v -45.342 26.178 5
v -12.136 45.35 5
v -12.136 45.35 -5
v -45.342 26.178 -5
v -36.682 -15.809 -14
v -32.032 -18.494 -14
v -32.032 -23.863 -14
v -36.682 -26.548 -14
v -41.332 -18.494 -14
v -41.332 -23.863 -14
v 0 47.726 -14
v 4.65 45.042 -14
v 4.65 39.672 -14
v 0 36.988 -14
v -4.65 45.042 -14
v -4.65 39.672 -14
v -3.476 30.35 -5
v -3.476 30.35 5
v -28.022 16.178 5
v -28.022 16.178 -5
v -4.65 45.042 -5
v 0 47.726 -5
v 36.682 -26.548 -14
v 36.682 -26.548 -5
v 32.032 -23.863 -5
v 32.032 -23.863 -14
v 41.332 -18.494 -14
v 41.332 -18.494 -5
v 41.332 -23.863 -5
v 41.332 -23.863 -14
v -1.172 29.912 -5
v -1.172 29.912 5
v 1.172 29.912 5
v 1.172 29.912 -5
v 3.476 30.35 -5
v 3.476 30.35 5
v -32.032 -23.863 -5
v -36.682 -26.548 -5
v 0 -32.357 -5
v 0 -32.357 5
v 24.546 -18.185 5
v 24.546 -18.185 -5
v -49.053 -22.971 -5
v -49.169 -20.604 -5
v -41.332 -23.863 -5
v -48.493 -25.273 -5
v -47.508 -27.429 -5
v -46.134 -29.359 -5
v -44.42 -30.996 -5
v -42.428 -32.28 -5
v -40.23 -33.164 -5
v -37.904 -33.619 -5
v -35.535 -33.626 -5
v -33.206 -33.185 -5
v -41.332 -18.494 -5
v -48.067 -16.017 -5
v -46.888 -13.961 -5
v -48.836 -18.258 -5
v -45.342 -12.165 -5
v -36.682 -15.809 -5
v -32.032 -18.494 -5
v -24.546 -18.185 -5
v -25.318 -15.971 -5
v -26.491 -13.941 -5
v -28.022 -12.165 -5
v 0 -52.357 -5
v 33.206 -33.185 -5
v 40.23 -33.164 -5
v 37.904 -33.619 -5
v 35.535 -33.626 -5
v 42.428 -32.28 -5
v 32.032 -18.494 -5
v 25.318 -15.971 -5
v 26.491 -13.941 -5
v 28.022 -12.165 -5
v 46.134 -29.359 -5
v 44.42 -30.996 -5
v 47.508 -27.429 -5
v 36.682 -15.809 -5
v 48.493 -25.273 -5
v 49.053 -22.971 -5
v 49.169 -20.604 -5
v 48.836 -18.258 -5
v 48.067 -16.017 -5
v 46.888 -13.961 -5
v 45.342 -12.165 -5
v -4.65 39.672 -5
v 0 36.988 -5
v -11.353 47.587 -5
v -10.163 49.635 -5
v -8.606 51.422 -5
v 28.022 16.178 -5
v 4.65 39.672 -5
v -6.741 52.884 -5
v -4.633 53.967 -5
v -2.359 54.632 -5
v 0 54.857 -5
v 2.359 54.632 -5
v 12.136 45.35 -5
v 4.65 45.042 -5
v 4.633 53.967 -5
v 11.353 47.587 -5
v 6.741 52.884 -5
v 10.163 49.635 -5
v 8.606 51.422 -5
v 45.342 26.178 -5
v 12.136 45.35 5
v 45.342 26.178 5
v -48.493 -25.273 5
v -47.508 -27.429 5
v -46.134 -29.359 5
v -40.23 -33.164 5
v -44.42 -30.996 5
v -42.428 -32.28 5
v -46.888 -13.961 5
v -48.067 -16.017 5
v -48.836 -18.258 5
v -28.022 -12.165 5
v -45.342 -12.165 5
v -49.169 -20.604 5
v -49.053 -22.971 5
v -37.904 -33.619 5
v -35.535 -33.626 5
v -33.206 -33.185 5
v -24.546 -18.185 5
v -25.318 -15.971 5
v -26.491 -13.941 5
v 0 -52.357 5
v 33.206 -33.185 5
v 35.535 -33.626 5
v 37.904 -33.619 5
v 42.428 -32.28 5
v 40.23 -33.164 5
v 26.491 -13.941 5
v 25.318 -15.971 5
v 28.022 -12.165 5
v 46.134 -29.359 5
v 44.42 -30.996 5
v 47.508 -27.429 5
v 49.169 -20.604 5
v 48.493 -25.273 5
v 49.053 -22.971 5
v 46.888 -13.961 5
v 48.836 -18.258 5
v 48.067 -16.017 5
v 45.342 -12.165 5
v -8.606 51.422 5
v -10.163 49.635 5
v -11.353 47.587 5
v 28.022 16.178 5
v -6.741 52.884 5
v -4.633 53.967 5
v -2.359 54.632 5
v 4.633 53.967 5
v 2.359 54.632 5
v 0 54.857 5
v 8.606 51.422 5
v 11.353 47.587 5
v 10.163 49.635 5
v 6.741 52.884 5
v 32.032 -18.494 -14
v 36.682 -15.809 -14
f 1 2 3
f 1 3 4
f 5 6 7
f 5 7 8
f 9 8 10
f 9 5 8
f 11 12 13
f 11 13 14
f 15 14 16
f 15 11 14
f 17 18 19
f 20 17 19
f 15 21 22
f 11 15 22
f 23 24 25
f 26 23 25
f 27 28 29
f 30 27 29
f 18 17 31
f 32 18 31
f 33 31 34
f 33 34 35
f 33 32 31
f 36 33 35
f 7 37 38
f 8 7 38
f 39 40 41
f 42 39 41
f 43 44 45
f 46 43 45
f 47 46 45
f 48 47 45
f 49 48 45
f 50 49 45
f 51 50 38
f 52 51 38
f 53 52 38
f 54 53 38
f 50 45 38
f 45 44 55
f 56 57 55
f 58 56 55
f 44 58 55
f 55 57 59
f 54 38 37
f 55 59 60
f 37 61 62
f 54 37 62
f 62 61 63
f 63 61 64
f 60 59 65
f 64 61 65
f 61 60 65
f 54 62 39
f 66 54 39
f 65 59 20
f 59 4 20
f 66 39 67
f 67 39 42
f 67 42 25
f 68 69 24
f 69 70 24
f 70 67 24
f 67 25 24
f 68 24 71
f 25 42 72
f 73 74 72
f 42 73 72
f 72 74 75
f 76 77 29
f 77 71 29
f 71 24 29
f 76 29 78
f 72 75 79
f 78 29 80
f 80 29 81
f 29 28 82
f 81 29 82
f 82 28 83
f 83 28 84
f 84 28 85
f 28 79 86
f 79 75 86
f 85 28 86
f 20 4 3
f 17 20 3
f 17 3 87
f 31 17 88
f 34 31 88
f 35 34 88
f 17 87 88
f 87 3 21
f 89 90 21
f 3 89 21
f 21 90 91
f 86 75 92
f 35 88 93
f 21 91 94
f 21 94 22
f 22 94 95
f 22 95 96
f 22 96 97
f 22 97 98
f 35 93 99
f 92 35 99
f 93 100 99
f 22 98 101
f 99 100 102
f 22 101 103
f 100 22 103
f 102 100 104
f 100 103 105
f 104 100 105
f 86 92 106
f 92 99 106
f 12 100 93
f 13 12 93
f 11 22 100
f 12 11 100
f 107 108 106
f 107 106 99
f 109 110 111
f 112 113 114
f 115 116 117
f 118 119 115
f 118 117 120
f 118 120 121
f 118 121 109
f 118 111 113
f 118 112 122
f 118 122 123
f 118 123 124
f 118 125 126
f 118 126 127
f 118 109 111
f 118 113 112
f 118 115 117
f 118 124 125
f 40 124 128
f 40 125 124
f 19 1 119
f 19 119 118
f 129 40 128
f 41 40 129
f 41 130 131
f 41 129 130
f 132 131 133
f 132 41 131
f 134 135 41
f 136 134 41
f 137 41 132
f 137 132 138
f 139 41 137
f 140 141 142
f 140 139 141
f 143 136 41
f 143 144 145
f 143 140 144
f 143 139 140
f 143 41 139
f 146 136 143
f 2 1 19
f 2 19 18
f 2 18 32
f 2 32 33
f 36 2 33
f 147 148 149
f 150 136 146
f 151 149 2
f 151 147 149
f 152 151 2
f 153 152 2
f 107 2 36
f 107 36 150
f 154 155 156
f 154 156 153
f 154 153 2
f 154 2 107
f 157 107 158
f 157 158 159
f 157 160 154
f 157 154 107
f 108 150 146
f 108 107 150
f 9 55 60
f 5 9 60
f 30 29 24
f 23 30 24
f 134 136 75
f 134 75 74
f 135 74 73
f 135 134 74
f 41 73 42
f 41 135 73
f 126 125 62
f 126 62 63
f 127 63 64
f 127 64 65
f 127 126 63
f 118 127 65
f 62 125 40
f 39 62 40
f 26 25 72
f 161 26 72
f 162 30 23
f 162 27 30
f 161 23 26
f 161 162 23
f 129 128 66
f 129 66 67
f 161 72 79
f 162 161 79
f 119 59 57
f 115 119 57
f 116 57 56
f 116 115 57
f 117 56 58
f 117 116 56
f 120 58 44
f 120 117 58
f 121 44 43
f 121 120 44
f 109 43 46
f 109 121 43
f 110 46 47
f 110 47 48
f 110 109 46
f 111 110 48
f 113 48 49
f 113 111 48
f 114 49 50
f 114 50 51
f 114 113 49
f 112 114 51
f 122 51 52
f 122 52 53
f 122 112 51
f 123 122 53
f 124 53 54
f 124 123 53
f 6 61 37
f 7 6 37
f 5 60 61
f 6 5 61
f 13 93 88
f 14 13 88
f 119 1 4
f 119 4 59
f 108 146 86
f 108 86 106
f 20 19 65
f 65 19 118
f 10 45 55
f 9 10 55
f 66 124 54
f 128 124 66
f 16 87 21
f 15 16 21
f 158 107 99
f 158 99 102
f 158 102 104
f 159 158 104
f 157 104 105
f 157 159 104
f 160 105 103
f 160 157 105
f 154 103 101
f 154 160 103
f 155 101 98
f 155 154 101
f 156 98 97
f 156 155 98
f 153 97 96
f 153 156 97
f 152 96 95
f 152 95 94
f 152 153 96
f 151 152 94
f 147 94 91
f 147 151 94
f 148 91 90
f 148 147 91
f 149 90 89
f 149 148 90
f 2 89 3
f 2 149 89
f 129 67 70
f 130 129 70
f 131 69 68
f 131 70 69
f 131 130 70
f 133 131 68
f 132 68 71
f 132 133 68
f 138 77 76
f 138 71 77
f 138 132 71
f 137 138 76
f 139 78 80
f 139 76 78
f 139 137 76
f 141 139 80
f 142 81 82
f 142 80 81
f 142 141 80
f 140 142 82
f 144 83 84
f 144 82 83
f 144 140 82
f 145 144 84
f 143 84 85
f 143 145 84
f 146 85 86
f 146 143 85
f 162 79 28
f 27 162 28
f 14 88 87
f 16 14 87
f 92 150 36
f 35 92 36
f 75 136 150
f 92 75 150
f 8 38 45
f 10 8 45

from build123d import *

# Parameters (mm, degrees)
SKETCH3_R           = 12.5
BOSS_EXTRUDE2_DEPTH = 5
BOSS_EXTRUDE3_DEPTH = 9


with BuildPart() as part:
    # Sketch3 → Boss-Extrude2 (new, symmetric)
    # profile 1 of 4: a face of its own
    with BuildSketch(Plane.XY):
        with Locations((-36.682238028, -21.1785)):
            Circle(SKETCH3_R)
    # profile 2 of 4: a face of its own
    with BuildSketch(Plane.XY):
        with Locations((36.682238028, -21.1785)):
            Circle(SKETCH3_R)
    # profile 3 of 4: a face of its own
    with BuildSketch(Plane.XY):
        with Locations((0, 42.357)):
            Circle(SKETCH3_R)
    # profile 4 of 4: a face of its own
    with BuildSketch(Plane.XY):
        Polygon((0, 52.357), (-45.342492066, 26.1785), (-45.342492066, -26.1785), (0, -52.357), (45.342492066, -26.1785), (45.342492066, 26.1785), align=None)
        Polygon((0, 32.357), (-28.02198399, 16.1785), (-28.02198399, -16.1785), (0, -32.357), (28.02198399, -16.1785), (28.02198399, 16.1785), align=None, mode=Mode.SUBTRACT)
    extrude(amount=BOSS_EXTRUDE2_DEPTH, both=True)

    # Sketch4 → Boss-Extrude3 (add)
    with BuildSketch(Plane(origin=(0, 0, -5), x_dir=(-1, 0, 0), z_dir=(0, 0, -1))):
        Polygon((-41.332238028, -23.863178752), (-36.682238028, -26.547857503), (-32.032238028, -23.863178752), (-32.032238028, -18.493821248), (-36.682238028, -15.809142497), (-41.332238028, -18.493821248), align=None)
        Polygon((41.332238028, -23.863178752), (41.332238028, -18.493821248), (36.682238028, -15.809142497), (32.032238028, -18.493821248), (32.032238028, -23.863178752), (36.682238028, -26.547857503), align=None)
        Polygon((0, 47.726357503), (-4.65, 45.041678752), (-4.65, 39.672321248), (0, 36.987642497), (4.65, 39.672321248), (4.65, 45.041678752), align=None)
    extrude(amount=BOSS_EXTRUDE3_DEPTH)


solid = part.part
